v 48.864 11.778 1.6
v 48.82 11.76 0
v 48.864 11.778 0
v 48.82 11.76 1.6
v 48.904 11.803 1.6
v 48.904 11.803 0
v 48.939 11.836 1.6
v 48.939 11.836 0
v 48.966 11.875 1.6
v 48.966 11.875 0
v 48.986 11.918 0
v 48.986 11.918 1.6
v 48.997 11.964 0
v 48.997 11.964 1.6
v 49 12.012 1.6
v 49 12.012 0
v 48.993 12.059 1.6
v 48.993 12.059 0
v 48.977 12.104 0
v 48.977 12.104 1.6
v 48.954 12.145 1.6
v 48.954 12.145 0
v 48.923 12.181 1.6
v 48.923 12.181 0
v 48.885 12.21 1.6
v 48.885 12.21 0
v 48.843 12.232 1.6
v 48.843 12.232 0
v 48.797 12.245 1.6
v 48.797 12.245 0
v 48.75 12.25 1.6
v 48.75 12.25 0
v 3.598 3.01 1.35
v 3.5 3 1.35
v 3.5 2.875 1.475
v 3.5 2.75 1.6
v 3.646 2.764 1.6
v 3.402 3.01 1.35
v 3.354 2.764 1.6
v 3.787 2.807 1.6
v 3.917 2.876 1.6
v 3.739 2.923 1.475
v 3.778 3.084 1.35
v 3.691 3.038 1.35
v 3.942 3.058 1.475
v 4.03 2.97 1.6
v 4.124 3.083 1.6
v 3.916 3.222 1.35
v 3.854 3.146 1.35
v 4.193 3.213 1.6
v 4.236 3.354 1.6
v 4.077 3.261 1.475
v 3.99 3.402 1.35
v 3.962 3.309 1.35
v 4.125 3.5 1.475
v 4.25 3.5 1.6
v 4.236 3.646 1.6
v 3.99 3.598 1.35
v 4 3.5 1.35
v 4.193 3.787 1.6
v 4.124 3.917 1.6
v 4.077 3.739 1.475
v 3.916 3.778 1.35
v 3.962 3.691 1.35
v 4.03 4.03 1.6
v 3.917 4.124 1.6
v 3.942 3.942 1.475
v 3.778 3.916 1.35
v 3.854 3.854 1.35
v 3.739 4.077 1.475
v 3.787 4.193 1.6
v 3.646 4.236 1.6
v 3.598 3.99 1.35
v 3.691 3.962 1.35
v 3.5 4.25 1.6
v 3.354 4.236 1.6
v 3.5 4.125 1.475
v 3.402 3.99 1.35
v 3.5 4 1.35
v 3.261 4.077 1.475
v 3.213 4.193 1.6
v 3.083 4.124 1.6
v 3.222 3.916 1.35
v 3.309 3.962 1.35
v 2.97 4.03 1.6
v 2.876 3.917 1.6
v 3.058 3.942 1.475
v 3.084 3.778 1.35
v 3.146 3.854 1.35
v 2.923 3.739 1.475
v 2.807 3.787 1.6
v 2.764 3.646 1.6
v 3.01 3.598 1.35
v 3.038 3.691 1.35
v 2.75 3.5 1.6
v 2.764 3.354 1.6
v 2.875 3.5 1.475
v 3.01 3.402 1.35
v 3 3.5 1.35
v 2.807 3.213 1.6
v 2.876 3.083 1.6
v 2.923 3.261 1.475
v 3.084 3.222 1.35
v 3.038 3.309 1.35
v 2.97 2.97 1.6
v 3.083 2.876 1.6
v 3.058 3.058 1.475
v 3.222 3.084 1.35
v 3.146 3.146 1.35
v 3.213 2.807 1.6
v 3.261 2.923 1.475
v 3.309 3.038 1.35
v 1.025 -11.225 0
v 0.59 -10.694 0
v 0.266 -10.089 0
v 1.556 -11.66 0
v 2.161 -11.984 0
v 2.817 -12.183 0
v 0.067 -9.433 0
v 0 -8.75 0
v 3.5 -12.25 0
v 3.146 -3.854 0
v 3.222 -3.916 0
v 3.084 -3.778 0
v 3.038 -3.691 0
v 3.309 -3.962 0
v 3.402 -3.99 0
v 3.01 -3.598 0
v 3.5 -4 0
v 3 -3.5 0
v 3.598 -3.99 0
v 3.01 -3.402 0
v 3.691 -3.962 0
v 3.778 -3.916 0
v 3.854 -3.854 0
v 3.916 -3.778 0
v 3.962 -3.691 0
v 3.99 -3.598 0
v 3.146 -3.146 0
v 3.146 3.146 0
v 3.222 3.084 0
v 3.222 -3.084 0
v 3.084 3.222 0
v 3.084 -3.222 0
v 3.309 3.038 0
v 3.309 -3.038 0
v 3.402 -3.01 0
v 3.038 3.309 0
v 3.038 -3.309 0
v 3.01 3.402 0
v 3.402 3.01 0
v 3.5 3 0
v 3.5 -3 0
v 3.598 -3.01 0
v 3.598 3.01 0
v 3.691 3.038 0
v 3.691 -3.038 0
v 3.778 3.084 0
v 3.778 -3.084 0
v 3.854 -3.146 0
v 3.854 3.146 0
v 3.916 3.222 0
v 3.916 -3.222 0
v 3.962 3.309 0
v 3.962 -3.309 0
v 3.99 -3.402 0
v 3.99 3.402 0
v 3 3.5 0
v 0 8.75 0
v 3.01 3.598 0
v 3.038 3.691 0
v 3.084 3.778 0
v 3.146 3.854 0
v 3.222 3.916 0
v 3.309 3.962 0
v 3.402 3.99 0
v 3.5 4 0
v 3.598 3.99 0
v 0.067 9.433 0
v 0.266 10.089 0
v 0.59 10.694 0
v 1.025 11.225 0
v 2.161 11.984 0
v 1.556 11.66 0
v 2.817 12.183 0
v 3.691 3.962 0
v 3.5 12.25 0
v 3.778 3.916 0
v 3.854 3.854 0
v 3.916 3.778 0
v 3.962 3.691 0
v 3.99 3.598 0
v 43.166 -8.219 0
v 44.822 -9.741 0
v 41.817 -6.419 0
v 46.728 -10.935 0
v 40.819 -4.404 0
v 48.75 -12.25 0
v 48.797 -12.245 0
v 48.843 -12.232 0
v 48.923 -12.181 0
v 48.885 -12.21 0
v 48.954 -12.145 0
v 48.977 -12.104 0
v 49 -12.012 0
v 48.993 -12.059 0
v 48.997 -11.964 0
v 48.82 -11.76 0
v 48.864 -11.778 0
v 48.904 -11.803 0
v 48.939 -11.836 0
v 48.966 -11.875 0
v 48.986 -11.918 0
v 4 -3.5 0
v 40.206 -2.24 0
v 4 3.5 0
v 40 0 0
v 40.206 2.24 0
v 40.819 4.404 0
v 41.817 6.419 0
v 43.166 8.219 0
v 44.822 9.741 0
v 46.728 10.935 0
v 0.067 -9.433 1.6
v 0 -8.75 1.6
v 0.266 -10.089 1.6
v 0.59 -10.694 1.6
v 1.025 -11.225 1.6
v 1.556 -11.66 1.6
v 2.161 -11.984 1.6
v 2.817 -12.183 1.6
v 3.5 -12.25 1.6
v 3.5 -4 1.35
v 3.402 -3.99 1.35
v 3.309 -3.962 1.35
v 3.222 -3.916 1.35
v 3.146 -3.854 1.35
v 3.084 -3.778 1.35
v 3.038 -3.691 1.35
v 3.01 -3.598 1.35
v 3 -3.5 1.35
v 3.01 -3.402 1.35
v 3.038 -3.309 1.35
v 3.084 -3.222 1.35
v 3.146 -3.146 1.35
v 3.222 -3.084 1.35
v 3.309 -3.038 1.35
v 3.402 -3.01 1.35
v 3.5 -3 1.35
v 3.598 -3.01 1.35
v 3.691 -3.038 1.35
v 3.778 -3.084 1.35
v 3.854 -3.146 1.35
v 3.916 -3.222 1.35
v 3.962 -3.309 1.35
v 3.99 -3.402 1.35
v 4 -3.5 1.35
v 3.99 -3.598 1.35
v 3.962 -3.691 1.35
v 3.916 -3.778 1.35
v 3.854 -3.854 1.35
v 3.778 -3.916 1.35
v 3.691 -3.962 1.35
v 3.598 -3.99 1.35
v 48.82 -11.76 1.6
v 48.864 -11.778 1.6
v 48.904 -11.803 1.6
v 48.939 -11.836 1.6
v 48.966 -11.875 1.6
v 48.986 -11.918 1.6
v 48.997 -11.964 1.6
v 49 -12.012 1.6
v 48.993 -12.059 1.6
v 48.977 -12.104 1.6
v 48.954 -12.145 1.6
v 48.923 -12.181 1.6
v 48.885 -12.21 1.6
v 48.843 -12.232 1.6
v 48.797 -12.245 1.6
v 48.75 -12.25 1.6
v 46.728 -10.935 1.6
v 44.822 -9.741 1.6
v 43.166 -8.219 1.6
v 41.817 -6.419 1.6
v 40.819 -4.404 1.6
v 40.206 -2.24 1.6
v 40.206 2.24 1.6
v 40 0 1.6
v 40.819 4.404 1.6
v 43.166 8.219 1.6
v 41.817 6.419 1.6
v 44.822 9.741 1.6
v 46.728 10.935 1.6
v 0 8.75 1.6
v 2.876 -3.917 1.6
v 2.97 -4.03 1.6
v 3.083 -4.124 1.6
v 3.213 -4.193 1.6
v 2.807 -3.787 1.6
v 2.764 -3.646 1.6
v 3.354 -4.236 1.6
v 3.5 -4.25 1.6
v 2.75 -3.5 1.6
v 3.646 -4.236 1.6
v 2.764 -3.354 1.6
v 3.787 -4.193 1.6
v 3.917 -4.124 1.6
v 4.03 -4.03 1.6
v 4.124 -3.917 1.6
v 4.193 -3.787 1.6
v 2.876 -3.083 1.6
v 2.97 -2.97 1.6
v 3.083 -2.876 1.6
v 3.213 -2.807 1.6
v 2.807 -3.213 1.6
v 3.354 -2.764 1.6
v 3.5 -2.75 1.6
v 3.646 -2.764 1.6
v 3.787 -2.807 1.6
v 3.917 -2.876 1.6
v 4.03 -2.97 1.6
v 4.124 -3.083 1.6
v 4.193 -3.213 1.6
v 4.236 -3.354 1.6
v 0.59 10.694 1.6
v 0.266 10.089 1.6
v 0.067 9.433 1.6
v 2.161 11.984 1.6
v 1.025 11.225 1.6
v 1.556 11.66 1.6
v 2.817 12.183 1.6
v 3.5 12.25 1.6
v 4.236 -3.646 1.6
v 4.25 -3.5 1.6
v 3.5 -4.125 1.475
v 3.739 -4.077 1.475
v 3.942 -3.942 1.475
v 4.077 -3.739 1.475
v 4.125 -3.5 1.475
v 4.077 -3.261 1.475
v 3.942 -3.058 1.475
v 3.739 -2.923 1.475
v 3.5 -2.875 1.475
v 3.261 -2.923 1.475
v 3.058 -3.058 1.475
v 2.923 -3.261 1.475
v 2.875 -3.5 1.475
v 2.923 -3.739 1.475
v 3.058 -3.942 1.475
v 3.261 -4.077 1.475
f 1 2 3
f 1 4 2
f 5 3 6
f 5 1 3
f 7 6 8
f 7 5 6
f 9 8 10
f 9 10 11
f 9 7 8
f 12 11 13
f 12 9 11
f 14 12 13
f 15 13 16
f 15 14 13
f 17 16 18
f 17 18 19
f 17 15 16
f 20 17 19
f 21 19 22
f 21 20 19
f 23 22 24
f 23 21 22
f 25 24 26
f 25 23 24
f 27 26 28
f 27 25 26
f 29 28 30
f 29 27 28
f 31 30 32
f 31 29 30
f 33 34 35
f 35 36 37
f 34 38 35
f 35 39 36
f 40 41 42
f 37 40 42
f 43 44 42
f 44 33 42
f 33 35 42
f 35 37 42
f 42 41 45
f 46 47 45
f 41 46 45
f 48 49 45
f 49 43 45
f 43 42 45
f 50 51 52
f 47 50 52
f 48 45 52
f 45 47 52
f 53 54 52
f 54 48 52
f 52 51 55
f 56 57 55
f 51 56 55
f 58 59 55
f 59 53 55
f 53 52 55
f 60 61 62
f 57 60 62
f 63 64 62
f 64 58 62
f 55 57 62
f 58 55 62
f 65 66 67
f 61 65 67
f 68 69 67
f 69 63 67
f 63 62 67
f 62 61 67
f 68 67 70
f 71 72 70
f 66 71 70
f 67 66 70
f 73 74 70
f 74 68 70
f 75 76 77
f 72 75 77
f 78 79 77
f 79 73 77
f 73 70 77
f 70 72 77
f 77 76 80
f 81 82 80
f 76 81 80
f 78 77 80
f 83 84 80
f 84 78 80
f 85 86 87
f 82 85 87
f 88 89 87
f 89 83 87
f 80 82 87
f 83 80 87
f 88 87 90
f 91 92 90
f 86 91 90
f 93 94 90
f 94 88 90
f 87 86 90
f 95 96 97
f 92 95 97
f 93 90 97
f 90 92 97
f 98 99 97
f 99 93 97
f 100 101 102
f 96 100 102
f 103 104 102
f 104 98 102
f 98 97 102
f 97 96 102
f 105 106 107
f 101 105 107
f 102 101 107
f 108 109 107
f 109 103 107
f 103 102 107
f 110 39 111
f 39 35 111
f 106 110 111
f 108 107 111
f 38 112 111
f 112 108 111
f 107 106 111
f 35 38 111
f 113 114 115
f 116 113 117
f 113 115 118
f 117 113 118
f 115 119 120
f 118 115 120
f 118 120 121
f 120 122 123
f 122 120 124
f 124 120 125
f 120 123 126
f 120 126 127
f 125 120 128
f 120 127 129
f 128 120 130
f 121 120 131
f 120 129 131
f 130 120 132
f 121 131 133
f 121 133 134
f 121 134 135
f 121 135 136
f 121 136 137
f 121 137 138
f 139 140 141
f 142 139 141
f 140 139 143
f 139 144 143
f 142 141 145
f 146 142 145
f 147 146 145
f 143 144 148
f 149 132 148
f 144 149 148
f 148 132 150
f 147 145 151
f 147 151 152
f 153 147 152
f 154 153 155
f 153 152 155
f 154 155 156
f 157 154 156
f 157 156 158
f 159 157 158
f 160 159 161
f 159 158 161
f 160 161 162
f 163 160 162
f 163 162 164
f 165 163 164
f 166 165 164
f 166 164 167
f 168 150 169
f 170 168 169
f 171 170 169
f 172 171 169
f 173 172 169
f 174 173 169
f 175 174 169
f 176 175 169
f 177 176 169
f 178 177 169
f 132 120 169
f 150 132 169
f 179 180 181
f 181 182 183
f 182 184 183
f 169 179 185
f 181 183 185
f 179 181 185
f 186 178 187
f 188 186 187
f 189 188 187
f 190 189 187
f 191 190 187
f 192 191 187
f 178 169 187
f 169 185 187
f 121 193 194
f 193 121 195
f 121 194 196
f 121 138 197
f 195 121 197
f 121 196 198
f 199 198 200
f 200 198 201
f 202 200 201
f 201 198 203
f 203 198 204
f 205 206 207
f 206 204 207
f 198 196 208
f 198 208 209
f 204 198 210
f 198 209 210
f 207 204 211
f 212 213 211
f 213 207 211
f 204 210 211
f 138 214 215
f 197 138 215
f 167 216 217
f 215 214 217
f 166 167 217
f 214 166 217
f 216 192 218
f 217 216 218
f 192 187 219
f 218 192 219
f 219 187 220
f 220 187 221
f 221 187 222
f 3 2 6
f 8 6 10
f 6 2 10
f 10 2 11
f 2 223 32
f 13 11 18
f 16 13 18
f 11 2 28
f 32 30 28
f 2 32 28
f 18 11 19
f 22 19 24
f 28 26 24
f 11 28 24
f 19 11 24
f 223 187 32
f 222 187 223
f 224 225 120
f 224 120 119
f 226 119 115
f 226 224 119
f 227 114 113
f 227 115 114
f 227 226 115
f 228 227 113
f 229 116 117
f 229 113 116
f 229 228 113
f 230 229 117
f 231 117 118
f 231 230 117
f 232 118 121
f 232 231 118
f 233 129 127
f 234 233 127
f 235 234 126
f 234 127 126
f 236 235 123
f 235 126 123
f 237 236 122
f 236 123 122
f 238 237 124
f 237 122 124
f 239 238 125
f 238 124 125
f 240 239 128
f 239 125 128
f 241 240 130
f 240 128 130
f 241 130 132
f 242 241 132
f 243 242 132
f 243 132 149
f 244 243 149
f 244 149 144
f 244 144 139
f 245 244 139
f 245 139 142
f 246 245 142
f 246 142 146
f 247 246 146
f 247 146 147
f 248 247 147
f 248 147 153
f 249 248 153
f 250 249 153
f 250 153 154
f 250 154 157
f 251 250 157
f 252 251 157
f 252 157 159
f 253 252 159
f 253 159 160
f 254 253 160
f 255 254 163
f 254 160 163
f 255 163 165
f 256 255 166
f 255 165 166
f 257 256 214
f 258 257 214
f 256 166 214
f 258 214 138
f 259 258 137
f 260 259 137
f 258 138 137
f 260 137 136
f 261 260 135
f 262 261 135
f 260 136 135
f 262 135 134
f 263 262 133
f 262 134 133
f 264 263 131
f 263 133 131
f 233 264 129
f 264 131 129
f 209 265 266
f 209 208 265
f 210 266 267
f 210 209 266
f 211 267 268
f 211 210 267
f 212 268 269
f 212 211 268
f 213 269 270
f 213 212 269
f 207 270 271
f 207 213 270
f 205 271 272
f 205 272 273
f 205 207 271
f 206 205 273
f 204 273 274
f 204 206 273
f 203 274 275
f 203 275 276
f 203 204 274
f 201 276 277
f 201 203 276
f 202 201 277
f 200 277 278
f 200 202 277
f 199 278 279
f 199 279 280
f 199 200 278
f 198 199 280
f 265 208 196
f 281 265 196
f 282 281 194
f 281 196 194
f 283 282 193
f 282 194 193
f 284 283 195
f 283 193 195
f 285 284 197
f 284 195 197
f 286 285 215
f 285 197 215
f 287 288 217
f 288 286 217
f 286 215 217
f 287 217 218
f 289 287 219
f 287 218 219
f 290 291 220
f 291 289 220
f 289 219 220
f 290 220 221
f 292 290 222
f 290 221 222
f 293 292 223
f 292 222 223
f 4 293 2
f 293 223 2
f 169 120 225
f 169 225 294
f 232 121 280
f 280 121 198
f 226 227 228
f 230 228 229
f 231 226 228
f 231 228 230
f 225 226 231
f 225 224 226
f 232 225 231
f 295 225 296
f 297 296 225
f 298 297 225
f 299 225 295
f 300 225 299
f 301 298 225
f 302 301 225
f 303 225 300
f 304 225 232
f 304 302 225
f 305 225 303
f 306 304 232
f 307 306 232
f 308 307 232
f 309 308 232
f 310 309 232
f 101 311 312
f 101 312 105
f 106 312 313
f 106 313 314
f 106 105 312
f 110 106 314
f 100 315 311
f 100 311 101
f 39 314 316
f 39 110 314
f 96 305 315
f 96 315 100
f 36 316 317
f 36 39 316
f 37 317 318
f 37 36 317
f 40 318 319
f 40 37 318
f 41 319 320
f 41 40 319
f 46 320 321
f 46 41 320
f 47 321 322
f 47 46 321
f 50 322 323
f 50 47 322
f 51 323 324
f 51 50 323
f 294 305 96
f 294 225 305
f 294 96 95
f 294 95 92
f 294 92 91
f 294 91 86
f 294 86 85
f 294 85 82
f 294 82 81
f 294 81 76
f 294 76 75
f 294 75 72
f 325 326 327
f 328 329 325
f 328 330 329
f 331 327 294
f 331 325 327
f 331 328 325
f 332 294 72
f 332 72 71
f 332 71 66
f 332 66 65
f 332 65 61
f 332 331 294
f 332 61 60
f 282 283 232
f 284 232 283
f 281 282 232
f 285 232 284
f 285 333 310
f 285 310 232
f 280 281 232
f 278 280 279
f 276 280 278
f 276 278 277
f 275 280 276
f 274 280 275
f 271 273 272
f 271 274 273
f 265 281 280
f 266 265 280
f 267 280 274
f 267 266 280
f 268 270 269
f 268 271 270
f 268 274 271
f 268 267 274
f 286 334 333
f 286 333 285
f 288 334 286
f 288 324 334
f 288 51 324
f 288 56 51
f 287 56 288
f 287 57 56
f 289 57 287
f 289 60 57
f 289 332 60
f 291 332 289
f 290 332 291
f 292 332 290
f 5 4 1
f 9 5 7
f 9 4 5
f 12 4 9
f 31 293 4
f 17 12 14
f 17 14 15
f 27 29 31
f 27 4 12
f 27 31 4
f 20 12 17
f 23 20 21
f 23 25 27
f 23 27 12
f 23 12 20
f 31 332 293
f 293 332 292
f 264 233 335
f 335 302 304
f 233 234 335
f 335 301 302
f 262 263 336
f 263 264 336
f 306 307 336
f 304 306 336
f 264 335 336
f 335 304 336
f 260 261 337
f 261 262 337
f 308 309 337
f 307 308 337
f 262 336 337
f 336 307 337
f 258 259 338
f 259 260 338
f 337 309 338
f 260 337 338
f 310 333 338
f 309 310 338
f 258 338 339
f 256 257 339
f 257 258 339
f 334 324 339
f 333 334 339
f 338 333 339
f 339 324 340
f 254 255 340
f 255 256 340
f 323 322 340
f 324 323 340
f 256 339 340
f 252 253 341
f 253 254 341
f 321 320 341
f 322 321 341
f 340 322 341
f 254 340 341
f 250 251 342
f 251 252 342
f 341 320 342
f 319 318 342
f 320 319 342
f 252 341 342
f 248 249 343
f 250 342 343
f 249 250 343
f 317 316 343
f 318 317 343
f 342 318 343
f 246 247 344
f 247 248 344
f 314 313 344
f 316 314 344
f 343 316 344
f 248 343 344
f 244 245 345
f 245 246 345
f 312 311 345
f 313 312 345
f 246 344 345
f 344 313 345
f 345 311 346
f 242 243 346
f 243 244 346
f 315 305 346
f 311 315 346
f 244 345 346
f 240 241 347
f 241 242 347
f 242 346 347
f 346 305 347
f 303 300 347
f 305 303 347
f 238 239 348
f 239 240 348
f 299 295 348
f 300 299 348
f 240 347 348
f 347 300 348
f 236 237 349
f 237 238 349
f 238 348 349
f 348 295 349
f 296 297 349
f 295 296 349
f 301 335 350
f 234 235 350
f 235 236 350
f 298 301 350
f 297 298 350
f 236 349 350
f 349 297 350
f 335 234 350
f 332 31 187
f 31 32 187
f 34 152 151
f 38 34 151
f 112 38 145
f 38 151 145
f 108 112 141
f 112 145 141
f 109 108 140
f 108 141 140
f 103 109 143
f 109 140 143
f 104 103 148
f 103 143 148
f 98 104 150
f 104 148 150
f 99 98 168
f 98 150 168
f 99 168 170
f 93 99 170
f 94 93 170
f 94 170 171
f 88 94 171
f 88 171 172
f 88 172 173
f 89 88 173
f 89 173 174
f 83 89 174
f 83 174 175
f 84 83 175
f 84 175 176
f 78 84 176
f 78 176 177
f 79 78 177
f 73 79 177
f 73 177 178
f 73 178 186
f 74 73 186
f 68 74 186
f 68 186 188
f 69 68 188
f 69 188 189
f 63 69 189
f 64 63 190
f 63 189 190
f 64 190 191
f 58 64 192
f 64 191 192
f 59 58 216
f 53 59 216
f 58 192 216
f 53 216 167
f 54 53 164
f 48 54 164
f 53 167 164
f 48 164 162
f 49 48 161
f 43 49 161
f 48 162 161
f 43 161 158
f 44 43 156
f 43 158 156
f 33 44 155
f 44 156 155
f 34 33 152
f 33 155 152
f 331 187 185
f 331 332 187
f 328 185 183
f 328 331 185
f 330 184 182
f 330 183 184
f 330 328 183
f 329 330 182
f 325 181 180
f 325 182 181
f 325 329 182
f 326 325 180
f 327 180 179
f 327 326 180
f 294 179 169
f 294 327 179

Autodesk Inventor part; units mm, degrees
ref_plane "YZ Plane" through (0, 0, 0) normal (1, 0, 0) x (0, 1, 0)
ref_plane "XZ Plane" through (0, 0, 0) normal (0, 1, 0) x (-1, 0, 0)
ref_plane "XY Plane" through (0, 0, 0) normal (0, 0, 1) x (1, 0, 0)
sketch "Эскиз1" plane through (0, 0, 0) normal (0, 0, 1) x (1, 0, 0)
  line L0 (52.25, 12.25) -> (0, 12.25)
  line L1 (0, -12.25) -> (52.25, -12.25)
  arc A0 (52.25, 12.25) -> (52.25, -12.25) centre (52.25, 0) ccw
  line L2 (0, -12.25) -> (0, 12.25)
  line L3 (0, 0) -> (40, 0) construction
  line L4 (0, 0) -> (0, 12.25) construction
  line L5 (0, 12.25) -> (0, 11.25)
  point P0 (20, 0)
  dimension "d0" = 12.25
  dimension "d47" = 40
extrude "Выдавливание3" add sketch "Эскиз1" along normal blind 1.6
fillet "Сопряжение3" radius 0.25 2 edges at (52.25, 12.25, 0.8) (52.25, -12.25, 0.8)
fillet "Сопряжение4" radius 3.5 2 edges at (0, -12.25, 0.8) (0, 12.25, 0.8)
sketch "Эскиз6" plane through (0, 0, 1.6) normal (0, 0, 1) x (1, 0, 0)
  arc A0 (48.82, 11.76) -> (48.82, -11.76) centre (52.25, 0) ccw construction
  line L0 (40, 0) -> (0, 0) construction
  line L1 (0, -12.25) -> (0, 12.25) construction
  circle A1 centre (3.5, 3.5) radius 0.5
  line L2 (3.5, 3.5) -> (0, 3.5) construction
  line L3 (3.5, 3.5) -> (3.5, 0) construction
  circle A2 centre (3.5, -3.5) radius 0.5
  point P0 (48.75, -12.25)
  dimension "d58" = 1
  dimension "d59" = 3.5
hole "Отверстие1" at (3.5, -3.5, 1.6) at (3.5, 3.5, 1.6) direction (0, 0, -1) diameter 1 end through all countersink diameter 1.5 countersink angle 90
properties part number "Поршень"
